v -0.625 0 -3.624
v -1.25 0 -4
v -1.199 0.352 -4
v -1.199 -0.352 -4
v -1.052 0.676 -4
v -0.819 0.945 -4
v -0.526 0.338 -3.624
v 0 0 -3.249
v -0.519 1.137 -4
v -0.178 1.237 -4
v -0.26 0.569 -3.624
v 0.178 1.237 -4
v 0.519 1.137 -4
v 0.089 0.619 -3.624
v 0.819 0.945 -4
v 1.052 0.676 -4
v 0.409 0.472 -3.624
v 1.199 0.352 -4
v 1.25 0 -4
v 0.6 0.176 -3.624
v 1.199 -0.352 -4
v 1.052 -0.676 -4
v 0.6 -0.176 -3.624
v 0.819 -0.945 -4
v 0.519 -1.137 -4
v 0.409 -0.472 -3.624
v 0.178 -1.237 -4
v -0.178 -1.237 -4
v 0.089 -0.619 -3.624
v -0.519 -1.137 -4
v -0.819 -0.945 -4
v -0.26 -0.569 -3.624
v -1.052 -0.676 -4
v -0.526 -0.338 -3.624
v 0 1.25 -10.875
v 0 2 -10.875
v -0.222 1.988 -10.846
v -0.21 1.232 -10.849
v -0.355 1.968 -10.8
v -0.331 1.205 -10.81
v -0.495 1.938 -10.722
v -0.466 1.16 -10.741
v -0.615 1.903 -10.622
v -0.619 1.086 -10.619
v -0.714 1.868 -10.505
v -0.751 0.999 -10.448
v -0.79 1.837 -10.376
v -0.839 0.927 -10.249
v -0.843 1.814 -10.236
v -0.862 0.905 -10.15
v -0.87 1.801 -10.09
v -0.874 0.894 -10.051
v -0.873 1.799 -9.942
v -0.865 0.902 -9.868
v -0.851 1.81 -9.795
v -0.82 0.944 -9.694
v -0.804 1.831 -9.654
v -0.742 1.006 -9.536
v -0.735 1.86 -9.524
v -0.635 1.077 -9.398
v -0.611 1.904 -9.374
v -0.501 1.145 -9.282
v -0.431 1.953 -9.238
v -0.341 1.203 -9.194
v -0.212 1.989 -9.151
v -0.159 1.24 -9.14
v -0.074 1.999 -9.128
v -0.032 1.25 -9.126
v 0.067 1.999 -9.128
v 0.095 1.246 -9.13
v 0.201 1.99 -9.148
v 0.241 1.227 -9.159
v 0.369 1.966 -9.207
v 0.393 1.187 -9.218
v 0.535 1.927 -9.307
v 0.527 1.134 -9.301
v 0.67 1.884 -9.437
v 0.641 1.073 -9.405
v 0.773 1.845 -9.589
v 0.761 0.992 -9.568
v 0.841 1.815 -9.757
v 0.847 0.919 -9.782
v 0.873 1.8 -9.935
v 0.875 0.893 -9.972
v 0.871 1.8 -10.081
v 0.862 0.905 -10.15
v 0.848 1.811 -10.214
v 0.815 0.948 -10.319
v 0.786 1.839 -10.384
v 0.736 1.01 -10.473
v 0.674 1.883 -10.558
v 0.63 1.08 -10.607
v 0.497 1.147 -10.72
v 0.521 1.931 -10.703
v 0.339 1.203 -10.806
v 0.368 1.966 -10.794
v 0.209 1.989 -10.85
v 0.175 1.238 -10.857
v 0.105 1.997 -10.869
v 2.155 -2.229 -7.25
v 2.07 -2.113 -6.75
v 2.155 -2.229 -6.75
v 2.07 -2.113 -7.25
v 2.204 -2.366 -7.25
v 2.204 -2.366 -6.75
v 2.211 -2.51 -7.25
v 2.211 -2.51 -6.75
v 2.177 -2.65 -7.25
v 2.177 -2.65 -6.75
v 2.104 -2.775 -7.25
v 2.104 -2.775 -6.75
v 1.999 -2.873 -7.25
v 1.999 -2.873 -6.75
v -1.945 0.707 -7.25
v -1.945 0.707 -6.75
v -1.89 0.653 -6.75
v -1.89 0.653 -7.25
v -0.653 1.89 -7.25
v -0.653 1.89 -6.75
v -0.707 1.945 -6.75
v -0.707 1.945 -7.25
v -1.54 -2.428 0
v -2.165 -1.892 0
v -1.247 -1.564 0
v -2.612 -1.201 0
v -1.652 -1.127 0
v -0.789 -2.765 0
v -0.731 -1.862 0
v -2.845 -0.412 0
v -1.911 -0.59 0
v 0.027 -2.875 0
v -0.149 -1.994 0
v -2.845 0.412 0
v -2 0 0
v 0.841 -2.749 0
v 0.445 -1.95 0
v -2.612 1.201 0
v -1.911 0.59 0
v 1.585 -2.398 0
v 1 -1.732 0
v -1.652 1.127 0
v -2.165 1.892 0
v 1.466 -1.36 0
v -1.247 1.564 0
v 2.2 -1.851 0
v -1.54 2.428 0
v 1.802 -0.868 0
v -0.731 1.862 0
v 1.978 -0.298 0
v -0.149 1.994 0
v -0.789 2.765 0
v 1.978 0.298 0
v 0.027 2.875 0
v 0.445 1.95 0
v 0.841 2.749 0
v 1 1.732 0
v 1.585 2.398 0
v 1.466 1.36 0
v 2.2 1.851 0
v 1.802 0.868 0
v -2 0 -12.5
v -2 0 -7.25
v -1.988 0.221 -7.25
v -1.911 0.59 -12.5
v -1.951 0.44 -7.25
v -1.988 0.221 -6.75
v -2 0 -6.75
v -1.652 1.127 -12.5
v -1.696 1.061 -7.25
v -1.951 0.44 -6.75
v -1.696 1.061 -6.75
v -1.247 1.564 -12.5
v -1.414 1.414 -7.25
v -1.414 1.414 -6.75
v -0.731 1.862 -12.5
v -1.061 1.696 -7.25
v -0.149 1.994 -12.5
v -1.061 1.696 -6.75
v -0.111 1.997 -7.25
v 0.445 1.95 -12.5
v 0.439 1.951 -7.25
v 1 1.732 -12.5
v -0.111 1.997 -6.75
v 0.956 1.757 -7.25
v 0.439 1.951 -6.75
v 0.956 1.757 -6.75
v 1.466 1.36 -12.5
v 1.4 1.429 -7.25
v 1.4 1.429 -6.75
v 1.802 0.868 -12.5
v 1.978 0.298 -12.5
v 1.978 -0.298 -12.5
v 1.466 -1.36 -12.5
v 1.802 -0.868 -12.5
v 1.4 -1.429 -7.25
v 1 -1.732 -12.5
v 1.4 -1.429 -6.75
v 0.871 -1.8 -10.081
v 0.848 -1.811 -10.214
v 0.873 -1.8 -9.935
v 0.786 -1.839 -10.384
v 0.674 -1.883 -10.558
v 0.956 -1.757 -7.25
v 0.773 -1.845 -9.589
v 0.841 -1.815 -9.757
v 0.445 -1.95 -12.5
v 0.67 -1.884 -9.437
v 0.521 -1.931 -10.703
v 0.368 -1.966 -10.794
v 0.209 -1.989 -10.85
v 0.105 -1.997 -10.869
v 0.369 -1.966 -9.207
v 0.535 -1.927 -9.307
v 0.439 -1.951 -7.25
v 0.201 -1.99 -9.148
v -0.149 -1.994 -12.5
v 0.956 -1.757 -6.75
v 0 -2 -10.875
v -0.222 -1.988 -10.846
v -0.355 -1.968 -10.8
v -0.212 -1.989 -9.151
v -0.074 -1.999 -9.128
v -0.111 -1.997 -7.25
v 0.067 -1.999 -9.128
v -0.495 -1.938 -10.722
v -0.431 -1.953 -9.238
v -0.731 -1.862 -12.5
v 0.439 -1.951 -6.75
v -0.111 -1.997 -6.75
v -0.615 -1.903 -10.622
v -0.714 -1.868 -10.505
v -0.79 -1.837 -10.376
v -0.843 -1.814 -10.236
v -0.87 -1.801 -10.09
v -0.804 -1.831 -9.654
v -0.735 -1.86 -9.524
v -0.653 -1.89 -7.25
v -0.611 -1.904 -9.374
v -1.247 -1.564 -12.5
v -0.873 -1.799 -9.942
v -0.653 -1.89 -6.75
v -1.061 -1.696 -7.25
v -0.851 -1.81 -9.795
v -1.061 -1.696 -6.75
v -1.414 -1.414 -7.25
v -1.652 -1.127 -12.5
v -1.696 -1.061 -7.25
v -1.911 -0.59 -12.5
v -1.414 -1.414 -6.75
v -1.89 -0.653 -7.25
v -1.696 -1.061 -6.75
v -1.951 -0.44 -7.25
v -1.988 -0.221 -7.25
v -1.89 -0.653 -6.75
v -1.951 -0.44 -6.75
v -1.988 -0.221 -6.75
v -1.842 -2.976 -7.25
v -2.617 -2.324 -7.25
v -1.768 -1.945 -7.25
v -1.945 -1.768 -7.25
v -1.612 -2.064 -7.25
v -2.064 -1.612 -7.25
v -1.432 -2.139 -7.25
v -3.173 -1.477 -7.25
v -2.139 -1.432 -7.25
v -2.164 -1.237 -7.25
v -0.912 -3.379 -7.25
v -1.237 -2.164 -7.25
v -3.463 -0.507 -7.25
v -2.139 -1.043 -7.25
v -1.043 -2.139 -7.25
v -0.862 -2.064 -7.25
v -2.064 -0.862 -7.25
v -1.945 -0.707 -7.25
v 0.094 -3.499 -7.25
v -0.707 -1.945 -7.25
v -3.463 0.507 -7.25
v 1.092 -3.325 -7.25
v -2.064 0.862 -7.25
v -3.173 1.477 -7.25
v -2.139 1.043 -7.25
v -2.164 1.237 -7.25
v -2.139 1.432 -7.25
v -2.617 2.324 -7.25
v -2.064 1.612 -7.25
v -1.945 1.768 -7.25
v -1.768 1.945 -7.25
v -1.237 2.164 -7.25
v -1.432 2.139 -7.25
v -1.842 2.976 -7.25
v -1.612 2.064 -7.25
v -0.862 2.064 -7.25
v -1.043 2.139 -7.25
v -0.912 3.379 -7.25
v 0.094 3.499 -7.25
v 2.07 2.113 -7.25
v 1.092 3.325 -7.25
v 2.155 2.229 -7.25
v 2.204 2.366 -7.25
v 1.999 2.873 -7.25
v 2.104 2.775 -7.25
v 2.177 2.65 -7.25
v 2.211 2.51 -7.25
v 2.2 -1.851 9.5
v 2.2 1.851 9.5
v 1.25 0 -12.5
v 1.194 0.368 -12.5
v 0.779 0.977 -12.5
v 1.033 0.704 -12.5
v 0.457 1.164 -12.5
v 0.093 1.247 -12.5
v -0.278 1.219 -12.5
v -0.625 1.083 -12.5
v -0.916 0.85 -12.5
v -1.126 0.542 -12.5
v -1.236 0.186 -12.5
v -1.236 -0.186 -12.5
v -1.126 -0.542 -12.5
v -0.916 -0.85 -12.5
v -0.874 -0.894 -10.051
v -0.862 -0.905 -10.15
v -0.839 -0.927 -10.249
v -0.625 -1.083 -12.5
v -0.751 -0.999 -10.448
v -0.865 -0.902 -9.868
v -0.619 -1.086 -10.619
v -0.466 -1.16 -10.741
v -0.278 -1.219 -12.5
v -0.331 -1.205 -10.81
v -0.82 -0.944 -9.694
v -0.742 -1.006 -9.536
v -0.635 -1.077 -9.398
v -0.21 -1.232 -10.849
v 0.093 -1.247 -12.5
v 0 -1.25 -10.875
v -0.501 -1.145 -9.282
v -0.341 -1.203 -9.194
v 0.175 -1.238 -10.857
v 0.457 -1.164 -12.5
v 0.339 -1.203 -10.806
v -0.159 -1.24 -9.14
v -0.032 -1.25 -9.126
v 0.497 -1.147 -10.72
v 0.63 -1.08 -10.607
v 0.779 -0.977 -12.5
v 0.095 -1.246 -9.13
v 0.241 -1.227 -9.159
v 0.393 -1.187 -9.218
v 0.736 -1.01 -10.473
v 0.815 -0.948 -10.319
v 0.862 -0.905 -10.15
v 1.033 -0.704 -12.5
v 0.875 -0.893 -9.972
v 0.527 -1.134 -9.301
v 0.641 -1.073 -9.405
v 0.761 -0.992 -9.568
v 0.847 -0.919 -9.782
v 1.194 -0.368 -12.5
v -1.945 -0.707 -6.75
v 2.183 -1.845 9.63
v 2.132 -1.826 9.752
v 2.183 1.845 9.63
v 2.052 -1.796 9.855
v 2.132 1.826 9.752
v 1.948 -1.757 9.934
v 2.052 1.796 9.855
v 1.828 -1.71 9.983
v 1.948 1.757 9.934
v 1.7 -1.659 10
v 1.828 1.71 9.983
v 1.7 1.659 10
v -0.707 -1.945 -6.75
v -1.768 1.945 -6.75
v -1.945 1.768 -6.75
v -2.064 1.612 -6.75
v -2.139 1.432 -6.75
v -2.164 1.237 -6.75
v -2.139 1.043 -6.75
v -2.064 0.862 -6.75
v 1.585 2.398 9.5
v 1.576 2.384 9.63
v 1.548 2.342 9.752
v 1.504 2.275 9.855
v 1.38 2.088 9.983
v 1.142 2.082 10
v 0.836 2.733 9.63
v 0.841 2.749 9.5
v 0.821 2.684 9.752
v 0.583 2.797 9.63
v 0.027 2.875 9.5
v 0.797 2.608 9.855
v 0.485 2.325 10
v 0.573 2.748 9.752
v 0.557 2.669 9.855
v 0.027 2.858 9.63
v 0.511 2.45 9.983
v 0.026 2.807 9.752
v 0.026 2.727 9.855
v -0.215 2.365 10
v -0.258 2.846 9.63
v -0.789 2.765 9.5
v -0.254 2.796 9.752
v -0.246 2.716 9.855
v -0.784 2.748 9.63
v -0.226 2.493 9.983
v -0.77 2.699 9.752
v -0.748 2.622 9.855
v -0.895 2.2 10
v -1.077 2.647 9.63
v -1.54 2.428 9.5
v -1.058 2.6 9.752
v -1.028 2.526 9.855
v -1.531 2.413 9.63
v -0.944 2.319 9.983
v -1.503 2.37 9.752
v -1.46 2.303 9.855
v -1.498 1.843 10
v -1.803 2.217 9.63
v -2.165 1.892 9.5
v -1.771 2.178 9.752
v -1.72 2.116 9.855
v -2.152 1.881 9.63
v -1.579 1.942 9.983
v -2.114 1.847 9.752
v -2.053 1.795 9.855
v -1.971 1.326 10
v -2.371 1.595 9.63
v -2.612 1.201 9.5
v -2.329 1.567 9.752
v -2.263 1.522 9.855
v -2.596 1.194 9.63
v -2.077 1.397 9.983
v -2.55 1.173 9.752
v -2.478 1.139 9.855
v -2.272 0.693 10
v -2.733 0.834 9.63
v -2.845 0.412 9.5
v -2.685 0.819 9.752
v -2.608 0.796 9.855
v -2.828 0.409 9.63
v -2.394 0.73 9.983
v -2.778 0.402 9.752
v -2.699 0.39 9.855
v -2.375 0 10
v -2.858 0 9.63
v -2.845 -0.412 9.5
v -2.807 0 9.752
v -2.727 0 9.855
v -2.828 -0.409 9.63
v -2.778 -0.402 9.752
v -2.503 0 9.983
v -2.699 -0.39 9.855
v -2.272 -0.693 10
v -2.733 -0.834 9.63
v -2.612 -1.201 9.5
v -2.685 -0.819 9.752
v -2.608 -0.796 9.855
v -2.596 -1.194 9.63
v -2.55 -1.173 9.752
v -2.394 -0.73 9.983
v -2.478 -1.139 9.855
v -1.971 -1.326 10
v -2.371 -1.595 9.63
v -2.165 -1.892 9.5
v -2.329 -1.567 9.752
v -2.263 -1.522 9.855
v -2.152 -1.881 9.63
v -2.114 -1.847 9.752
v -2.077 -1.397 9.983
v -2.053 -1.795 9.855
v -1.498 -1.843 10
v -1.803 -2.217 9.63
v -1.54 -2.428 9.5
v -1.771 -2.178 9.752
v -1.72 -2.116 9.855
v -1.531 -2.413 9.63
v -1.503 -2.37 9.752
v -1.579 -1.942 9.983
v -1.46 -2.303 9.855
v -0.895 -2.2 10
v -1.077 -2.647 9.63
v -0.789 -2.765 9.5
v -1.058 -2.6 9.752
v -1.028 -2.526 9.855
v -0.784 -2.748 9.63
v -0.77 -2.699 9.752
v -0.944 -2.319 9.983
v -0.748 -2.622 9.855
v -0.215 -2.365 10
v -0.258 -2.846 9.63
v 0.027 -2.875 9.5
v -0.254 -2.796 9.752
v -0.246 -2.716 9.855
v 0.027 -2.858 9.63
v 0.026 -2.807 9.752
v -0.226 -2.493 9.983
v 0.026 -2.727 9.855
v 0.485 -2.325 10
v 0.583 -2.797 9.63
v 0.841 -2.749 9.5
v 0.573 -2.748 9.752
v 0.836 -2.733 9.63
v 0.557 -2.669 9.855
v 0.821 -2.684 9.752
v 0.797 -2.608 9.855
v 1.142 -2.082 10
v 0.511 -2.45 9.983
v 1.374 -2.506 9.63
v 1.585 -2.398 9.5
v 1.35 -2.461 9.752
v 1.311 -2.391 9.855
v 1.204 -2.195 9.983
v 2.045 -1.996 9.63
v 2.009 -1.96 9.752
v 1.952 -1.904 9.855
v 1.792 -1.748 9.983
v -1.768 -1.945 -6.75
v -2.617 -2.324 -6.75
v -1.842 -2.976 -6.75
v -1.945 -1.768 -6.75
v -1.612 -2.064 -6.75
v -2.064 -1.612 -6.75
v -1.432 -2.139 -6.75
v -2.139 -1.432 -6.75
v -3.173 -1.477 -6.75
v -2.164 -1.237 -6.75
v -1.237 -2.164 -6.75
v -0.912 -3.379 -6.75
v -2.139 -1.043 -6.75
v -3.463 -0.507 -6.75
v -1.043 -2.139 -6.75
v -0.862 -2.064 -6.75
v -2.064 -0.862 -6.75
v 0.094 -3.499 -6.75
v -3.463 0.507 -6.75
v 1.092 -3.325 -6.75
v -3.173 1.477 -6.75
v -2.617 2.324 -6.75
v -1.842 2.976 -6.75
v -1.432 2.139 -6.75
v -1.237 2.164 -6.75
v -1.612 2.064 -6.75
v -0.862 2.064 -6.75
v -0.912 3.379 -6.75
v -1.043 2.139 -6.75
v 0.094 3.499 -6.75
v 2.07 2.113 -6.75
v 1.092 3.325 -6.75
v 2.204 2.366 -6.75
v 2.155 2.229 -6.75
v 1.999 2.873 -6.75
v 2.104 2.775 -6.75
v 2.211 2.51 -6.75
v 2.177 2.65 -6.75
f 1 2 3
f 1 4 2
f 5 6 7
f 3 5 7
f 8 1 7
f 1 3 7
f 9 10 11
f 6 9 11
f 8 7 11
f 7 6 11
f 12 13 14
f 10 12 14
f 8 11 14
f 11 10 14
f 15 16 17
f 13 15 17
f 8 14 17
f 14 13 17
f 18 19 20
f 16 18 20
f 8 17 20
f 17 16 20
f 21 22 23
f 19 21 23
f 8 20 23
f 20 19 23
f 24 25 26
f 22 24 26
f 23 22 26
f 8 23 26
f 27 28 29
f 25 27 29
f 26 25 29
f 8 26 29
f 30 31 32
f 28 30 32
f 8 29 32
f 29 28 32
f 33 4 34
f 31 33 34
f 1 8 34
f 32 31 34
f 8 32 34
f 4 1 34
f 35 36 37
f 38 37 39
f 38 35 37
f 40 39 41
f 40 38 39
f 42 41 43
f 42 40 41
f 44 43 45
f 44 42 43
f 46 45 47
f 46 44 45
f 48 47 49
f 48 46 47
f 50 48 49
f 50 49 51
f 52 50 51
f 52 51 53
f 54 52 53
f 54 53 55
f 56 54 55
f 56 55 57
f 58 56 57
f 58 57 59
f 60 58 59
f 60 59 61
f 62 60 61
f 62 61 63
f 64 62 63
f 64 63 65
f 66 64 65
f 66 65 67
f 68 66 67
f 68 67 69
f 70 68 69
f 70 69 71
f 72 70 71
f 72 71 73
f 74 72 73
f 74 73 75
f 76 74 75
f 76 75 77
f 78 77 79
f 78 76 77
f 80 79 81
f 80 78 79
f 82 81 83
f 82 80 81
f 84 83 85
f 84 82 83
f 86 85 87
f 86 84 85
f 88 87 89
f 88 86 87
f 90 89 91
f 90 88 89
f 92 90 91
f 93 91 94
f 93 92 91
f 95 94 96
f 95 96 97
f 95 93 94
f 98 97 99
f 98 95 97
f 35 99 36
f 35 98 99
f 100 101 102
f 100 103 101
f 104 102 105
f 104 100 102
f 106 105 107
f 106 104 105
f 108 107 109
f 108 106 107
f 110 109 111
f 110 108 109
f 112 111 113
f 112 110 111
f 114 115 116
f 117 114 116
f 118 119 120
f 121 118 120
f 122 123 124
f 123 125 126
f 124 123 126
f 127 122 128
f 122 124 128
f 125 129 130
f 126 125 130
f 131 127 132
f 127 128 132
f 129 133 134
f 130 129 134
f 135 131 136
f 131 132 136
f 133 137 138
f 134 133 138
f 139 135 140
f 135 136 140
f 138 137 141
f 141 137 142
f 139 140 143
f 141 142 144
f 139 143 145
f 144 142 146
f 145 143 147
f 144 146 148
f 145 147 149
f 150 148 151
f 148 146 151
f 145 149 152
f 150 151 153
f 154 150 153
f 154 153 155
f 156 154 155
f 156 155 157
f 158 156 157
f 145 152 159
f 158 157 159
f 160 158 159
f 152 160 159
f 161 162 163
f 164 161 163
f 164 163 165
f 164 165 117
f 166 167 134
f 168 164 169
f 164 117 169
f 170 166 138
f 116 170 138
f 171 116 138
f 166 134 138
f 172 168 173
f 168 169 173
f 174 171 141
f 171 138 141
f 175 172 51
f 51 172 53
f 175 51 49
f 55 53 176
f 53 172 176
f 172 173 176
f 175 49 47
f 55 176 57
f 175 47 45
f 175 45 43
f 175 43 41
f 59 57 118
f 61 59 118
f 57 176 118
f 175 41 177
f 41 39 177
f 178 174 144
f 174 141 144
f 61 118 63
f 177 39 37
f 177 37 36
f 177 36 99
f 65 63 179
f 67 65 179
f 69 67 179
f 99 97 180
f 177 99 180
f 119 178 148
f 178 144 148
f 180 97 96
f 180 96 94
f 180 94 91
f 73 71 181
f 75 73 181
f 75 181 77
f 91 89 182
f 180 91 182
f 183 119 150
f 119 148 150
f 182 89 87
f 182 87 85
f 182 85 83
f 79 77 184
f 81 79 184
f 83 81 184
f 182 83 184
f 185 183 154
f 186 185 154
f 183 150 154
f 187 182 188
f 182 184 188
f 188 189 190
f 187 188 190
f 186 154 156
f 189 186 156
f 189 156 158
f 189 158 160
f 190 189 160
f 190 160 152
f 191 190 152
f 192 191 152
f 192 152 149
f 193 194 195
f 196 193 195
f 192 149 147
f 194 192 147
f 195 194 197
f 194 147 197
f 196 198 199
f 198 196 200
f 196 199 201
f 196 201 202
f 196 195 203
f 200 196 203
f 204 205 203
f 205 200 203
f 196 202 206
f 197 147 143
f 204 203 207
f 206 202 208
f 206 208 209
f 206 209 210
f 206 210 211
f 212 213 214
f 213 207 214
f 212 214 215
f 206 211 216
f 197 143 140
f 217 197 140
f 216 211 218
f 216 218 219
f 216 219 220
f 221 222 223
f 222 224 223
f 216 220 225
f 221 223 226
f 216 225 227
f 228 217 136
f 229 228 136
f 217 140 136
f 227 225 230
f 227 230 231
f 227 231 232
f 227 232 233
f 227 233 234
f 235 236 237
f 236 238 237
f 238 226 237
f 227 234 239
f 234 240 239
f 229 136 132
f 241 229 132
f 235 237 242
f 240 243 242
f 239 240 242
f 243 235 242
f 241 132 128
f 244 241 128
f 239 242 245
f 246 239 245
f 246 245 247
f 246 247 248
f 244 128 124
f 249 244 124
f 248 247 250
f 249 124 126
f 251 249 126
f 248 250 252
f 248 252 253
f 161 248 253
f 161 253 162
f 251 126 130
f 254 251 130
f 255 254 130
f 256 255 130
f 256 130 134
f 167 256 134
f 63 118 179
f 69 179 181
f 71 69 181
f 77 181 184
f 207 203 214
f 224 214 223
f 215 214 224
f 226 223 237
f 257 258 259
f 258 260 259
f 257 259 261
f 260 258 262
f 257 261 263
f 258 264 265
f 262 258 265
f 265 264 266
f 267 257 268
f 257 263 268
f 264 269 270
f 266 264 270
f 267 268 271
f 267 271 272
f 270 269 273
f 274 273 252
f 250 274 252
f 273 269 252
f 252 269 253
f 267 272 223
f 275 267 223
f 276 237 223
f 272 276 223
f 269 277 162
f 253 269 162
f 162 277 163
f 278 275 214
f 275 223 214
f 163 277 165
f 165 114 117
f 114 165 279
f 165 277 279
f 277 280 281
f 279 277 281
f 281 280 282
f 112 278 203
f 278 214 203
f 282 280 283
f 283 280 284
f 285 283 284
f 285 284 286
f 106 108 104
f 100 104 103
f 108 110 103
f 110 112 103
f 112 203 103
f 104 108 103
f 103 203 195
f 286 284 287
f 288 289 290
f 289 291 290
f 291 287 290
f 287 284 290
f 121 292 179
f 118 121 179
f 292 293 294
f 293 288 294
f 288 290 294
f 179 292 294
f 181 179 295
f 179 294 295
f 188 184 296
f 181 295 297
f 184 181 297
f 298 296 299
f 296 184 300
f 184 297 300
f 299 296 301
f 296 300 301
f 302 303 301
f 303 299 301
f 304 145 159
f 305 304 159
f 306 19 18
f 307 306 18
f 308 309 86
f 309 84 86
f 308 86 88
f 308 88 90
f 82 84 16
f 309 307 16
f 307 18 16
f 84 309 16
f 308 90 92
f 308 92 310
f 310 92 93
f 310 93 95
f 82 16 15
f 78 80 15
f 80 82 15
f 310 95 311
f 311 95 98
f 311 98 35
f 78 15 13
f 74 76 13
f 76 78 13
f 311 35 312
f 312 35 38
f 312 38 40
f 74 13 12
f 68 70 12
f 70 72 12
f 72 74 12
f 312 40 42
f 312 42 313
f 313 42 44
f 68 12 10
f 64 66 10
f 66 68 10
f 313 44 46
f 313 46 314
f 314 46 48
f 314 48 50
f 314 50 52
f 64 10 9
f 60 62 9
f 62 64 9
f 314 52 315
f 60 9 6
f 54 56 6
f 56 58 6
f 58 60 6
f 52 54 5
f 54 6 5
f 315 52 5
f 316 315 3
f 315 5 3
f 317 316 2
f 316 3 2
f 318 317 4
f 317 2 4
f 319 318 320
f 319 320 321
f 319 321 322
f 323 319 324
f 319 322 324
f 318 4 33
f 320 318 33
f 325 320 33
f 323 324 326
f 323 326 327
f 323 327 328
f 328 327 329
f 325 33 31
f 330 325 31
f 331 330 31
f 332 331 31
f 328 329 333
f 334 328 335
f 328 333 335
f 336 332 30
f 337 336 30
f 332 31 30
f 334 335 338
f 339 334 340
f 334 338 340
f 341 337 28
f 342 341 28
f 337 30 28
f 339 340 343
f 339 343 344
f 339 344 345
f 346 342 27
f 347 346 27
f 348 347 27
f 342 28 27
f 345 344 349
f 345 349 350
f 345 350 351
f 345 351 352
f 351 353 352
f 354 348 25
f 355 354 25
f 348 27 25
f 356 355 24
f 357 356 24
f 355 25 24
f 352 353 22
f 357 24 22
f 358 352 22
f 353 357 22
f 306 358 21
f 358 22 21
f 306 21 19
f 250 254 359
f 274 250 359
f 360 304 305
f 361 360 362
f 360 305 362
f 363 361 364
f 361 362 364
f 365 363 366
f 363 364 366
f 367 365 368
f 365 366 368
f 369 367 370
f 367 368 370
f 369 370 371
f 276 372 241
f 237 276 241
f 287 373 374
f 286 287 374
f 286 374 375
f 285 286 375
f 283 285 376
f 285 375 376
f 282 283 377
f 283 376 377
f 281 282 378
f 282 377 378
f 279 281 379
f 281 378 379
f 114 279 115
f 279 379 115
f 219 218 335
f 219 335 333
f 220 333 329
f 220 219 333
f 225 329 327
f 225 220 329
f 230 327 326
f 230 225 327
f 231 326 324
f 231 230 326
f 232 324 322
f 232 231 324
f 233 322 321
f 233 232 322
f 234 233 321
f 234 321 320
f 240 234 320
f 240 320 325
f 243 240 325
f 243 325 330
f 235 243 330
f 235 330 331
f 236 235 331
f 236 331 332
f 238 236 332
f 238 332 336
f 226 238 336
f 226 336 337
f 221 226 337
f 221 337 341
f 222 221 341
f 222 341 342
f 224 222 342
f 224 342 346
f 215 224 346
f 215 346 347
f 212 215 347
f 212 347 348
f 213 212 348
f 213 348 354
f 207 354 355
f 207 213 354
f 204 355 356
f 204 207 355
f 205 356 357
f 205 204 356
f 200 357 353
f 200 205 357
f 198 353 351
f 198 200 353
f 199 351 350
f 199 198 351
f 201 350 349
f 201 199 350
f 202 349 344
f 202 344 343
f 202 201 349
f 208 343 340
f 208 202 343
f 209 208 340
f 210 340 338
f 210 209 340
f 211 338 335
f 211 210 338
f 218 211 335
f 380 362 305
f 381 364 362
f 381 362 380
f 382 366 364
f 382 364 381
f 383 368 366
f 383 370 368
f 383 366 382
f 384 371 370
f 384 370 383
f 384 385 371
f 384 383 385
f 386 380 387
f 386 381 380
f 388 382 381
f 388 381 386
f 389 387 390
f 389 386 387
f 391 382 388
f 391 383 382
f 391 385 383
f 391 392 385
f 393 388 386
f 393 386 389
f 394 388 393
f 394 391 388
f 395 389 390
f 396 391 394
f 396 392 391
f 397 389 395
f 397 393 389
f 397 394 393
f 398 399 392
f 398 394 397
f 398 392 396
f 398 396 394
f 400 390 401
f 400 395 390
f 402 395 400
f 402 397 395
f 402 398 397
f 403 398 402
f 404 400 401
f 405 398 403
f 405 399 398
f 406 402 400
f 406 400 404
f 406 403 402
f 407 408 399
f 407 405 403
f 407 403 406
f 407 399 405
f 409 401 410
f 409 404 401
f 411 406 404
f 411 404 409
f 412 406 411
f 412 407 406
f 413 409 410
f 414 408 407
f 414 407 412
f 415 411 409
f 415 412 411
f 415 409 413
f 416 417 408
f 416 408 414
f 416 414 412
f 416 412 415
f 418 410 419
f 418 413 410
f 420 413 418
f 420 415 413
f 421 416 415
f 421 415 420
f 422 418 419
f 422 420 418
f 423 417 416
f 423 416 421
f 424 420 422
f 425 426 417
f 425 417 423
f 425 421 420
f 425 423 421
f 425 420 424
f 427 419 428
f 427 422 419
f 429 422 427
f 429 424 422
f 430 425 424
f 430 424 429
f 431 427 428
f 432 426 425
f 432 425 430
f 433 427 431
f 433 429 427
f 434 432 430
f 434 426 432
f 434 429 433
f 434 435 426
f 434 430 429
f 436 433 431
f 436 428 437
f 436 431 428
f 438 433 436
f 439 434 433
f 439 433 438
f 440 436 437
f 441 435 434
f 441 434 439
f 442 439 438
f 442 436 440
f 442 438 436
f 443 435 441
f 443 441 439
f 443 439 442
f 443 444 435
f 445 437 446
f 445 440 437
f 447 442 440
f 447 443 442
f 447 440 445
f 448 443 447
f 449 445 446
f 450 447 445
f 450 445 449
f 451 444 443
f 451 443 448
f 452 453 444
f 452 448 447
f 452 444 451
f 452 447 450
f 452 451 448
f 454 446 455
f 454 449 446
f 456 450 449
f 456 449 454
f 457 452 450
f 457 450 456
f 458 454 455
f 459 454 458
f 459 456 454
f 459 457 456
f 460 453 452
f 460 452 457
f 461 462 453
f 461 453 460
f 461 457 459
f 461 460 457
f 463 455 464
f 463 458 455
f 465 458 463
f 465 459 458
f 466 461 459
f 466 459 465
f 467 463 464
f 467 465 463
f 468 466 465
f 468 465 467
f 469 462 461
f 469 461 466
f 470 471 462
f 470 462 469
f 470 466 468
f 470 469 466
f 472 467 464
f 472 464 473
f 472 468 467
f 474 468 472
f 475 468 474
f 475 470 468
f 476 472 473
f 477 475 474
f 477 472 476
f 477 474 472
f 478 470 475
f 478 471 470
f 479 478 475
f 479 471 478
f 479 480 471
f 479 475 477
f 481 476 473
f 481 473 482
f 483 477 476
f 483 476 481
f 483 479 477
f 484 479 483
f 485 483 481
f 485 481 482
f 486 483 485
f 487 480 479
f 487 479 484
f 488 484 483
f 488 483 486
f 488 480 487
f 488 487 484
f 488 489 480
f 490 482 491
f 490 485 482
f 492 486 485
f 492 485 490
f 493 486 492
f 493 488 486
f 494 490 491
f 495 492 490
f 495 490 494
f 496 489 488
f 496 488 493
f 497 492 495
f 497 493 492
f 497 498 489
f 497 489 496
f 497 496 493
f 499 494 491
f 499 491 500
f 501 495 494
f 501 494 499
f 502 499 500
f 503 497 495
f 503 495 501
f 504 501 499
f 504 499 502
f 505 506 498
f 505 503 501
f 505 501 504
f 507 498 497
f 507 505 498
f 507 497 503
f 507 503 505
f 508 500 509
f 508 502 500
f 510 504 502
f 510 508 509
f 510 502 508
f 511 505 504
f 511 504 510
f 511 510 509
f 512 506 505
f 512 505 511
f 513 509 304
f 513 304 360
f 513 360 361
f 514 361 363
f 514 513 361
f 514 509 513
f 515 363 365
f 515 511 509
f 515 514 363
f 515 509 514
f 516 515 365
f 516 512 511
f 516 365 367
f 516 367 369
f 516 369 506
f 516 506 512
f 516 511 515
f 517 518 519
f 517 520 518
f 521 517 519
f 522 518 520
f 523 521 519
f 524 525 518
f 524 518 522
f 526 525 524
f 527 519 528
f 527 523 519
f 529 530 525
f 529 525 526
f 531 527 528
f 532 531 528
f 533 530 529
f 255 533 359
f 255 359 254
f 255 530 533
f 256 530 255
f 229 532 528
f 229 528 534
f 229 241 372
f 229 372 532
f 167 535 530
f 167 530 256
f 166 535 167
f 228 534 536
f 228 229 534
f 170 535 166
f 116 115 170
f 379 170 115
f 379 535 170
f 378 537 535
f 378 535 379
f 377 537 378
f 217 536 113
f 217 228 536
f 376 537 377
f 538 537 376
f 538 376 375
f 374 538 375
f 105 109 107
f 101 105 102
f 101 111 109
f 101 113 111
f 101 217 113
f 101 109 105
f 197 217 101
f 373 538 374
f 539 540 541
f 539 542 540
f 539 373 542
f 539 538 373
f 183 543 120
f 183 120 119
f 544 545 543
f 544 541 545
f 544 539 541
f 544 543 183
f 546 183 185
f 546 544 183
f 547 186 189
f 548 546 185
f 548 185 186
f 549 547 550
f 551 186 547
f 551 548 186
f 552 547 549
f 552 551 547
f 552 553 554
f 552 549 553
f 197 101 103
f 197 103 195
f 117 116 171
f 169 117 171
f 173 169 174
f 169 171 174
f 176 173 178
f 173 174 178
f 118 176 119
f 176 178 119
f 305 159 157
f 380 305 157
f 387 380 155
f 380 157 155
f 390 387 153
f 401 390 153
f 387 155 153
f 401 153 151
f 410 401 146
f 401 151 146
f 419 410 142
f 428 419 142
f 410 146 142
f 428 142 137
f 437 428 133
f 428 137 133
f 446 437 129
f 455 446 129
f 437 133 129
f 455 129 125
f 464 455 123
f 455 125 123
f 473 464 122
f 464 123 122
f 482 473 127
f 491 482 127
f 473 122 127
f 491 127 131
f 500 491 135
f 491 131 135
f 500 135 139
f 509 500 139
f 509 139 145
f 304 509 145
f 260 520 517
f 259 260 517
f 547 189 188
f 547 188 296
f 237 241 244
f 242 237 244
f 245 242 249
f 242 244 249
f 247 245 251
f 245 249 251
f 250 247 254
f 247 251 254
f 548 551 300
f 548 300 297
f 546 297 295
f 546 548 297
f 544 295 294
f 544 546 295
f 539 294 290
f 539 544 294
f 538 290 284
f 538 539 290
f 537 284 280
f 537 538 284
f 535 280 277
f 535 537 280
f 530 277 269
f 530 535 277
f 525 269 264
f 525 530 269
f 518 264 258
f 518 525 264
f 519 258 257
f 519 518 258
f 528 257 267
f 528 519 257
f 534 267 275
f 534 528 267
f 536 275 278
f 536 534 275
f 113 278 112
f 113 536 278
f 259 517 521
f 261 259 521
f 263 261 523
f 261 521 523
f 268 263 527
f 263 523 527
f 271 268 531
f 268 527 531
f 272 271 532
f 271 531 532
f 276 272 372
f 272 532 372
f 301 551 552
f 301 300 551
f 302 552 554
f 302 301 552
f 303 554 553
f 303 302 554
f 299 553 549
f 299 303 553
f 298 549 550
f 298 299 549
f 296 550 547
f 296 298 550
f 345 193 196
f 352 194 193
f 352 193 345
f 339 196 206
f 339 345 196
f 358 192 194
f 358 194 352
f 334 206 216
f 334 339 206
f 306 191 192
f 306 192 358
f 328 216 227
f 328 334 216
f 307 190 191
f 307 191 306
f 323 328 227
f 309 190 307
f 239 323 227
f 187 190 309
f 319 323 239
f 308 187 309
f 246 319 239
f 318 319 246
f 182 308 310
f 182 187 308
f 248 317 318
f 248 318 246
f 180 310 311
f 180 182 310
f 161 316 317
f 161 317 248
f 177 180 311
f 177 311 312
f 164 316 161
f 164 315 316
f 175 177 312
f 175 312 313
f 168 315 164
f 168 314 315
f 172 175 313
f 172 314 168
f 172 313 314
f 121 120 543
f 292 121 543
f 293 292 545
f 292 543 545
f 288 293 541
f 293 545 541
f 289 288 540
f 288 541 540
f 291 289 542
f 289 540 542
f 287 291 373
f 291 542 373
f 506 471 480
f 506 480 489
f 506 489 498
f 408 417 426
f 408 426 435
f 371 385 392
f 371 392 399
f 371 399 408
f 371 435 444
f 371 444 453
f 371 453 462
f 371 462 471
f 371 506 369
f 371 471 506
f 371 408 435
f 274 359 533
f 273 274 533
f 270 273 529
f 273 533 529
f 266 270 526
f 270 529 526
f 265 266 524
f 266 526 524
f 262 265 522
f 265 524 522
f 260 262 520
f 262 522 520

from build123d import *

# Parameters (mm, degrees)
EXTRUDE_1_DEPTH          = 10
FILLET_1_R               = 0.5
SKETCH_2_R               = 2
EXTRUDE_2_DEPTH          = 12.5
EXTRUDE_START            = 0.5
EXTRUDE_3_DEPTH          = 0.5
CUT_EXTRUDE_START        = -0.5
CUT_EXTRUDE_1_DEPTH      = 0.5
FILLET_2_R               = 0.5
HOLE_WIZARD_M31_D        = 2.5
HOLE_WIZARD_M31_DEPTH    = 8.5
HOLE_WIZARD_M31_TIP      = 0.751075774
CUT_EXTRUDE_2_DEPTH      = 10
CUT_EXTRUDE_2_DEPTH_BACK = 10
SKETCH_8_R               = 0.875


with BuildPart() as part:
    # Эскиз1 → Бобышка-Вытянуть1 (new body)
    with BuildSketch(Plane.XY):
        with BuildLine():
            Line((2.2, -1.850844402), (2.2, 1.850844402))
            ThreePointArc((2.2, 1.850844402), (-2.875, 0), (2.2, -1.850844402))
        make_face()
    extrude(amount=EXTRUDE_1_DEPTH)

    # Скругление1
    fillet_1_edges = [part.edges().sort_by_distance(p)[0] for p in [
        (2.2, 0, 10),
        (-2.875, 0, 10),
    ]]
    fillet(fillet_1_edges, radius=FILLET_1_R)

    # Эскиз2 → Бобышка-Вытянуть2 (add)
    with BuildSketch(Plane(origin=(0, 0, 0), x_dir=(-1, 0, 0), z_dir=(0, 0, -1))):
        Circle(SKETCH_2_R)
    extrude(amount=EXTRUDE_2_DEPTH)

    # Эскиз3 → Бобышка-Вытянуть3 (add)
    with BuildSketch(Plane.XY.offset(-7.25).offset(EXTRUDE_START)):
        with BuildLine():
            Line((2.449489743, -2.5), (1.399708424, -1.428571429))
            ThreePointArc((1.399708424, -1.428571429), (-2, 0), (1.399708424, 1.428571429))
            Line((1.399708424, 1.428571429), (2.449489743, 2.5))
            ThreePointArc((2.449489743, 2.5), (-3.5, 0), (2.449489743, -2.5))
        make_face()
    extrude(amount=-EXTRUDE_3_DEPTH)

    # Эскиз4 → Вырез-Вытянуть1 (cut)
    with BuildSketch(Plane(origin=(0, 0, -7.25), x_dir=(-1, 0, 0), z_dir=(0, 0, -1)).offset(CUT_EXTRUDE_START)):
        with BuildLine():
            Line((1.944543648, -1.767766953), (1.767766953, -1.944543648))
            ThreePointArc((1.767766953, -1.944543648), (1.237436867, -2.164213562), (0.707106781, -1.944543648))
            Line((0.707106781, -1.944543648), (0.652968438, -1.890405305))
            ThreePointArc((0.652968438, -1.890405305), (1.414213562, -1.414213562), (1.890405305, -0.652968438))
            Line((1.890405305, -0.652968438), (1.944543648, -0.707106781))
            ThreePointArc((1.944543648, -0.707106781), (2.164213562, -1.237436867), (1.944543648, -1.767766953))
        make_face()
        with BuildLine():
            Line((1.767766953, 1.944543648), (1.944543648, 1.767766953))
            ThreePointArc((1.944543648, 1.767766953), (2.164213562, 1.237436867), (1.944543648, 0.707106781))
            Line((1.944543648, 0.707106781), (1.890405305, 0.652968438))
            ThreePointArc((1.890405305, 0.652968438), (1.414213562, 1.414213562), (0.652968438, 1.890405305))
            Line((0.652968438, 1.890405305), (0.707106781, 1.944543648))
            ThreePointArc((0.707106781, 1.944543648), (1.237436867, 2.164213562), (1.767766953, 1.944543648))
        make_face()
    extrude(amount=CUT_EXTRUDE_1_DEPTH, mode=Mode.SUBTRACT)

    # Скругление2
    fillet_2_edges = [part.edges().sort_by_distance(p)[0] for p in [
        (2.449489743, -2.5, -7),
        (2.449489743, 2.5, -7),
    ]]
    fillet(fillet_2_edges, radius=FILLET_2_R)

    # Отверстие обработанное метчиком M31
    with Locations(Plane(origin=(0, 0, -12.5), x_dir=(-1, 0, 0), z_dir=(0, 0, -1))):
        with Locations((0, 0)):
            Hole(HOLE_WIZARD_M31_D / 2, depth=HOLE_WIZARD_M31_DEPTH)
            with Locations((0, 0, -(HOLE_WIZARD_M31_DEPTH + HOLE_WIZARD_M31_TIP / 2))):  # 118° drill point
                Cone(0, HOLE_WIZARD_M31_D / 2, HOLE_WIZARD_M31_TIP, mode=Mode.SUBTRACT)

    # Эскиз8 → Вырез-Вытянуть2 (cut, two sides: drawn at the far end of the back side and taken through both)
    with BuildSketch(Plane(origin=(0, 0, 0), x_dir=(1, 0, 0), z_dir=(0, 1, 0)).offset(-CUT_EXTRUDE_2_DEPTH_BACK)):
        with Locations((0, 10)):
            Circle(SKETCH_8_R)
    extrude(amount=CUT_EXTRUDE_2_DEPTH + CUT_EXTRUDE_2_DEPTH_BACK, mode=Mode.SUBTRACT)


solid = part.part
